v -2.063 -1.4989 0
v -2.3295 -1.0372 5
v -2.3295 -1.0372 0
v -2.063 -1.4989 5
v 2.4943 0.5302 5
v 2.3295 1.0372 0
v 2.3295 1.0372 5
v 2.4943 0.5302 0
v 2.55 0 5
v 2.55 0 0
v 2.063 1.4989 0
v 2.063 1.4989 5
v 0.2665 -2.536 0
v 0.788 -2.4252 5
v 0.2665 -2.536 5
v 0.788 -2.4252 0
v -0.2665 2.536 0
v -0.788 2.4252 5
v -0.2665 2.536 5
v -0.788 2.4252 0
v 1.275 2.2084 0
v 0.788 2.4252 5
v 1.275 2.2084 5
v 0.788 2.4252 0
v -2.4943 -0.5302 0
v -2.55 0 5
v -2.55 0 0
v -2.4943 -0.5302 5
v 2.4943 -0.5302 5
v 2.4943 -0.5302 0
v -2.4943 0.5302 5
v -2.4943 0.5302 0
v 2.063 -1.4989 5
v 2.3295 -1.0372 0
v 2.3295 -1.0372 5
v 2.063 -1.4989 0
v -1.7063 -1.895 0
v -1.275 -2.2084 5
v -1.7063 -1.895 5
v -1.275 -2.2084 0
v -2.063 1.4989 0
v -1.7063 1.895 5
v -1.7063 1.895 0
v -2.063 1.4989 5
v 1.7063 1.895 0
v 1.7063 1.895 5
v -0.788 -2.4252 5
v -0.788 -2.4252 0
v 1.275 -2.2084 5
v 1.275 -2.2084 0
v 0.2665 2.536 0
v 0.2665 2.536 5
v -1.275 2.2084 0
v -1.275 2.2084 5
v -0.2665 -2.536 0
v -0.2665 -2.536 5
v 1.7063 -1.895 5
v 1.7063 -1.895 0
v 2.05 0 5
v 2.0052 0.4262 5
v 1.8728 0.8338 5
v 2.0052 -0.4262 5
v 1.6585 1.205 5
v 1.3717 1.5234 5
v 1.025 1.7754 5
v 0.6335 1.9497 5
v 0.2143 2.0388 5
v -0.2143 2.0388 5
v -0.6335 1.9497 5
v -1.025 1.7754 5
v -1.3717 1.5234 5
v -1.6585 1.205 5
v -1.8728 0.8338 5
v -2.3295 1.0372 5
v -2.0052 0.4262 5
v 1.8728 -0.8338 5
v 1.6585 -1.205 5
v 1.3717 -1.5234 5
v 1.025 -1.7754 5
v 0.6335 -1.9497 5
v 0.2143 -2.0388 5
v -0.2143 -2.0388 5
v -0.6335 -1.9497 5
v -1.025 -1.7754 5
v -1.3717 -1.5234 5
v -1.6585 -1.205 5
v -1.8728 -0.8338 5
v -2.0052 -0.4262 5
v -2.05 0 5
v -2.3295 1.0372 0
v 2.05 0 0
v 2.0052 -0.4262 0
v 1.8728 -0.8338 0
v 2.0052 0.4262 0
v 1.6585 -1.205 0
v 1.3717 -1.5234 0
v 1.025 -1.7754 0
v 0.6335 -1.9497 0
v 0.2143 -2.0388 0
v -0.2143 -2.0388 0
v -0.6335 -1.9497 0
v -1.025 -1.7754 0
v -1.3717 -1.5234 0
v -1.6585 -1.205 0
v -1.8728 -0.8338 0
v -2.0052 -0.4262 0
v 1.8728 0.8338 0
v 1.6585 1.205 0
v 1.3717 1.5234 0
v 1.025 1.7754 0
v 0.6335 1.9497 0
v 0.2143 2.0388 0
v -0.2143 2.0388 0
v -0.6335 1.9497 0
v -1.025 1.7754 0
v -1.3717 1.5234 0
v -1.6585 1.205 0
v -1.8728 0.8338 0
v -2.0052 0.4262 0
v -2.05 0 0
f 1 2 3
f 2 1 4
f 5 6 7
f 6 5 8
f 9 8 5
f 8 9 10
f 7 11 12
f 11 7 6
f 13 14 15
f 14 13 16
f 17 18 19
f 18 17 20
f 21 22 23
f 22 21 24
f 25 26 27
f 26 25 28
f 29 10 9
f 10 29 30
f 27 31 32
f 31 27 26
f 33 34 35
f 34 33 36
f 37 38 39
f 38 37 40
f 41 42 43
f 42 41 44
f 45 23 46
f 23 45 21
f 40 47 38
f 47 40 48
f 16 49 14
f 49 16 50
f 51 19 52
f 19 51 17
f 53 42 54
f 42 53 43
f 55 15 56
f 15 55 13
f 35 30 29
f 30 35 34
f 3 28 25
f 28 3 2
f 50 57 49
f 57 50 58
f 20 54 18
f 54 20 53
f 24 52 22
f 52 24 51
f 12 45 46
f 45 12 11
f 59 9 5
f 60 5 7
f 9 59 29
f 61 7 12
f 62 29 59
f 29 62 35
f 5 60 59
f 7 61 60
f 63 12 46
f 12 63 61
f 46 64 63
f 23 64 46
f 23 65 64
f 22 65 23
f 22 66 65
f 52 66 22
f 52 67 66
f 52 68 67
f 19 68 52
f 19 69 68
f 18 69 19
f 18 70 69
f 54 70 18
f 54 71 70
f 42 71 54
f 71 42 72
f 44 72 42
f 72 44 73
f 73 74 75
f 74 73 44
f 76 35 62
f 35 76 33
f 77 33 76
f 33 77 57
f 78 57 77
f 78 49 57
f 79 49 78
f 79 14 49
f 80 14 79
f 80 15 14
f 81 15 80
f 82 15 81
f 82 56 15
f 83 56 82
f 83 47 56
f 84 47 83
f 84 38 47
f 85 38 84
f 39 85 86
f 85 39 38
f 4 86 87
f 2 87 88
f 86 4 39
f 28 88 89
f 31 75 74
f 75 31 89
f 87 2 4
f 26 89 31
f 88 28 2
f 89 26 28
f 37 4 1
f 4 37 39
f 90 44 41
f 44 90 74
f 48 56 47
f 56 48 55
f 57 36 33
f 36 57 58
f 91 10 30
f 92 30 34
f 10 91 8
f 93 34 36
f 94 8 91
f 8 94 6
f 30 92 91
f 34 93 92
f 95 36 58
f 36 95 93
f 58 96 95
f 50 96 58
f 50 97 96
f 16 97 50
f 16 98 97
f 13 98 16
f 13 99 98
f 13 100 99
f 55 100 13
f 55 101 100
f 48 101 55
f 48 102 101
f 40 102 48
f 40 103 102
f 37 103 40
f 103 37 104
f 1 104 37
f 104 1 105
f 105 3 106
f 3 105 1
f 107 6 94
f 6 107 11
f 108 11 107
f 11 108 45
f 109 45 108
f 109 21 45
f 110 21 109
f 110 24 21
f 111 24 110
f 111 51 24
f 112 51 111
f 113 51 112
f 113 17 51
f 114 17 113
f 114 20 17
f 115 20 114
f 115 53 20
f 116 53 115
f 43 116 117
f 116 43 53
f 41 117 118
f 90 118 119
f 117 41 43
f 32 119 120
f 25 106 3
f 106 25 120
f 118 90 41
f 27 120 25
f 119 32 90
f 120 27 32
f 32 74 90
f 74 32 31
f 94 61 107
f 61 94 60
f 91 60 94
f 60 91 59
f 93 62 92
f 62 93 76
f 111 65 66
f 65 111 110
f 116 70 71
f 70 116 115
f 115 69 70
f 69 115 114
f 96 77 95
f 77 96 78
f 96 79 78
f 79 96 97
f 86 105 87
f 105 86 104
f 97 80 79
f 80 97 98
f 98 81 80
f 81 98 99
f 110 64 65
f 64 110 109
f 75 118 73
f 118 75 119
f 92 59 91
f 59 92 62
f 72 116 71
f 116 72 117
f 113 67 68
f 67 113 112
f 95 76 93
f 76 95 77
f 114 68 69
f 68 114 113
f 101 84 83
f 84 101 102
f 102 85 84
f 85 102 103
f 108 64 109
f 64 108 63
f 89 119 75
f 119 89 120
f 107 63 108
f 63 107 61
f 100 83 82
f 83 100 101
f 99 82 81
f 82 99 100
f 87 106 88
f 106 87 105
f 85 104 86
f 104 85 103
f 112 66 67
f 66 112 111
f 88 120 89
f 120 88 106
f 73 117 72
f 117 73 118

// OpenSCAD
$fn=30;
size=[3.8+0.3,0.5,5];//размер шрифта

difference(){
    cylinder(size.z, size.x/2+size.y, size.x/2+size.y); 
    translate([0,0,-0.1])cylinder(size.z*2, size.x/2, size.x/2); 
}
